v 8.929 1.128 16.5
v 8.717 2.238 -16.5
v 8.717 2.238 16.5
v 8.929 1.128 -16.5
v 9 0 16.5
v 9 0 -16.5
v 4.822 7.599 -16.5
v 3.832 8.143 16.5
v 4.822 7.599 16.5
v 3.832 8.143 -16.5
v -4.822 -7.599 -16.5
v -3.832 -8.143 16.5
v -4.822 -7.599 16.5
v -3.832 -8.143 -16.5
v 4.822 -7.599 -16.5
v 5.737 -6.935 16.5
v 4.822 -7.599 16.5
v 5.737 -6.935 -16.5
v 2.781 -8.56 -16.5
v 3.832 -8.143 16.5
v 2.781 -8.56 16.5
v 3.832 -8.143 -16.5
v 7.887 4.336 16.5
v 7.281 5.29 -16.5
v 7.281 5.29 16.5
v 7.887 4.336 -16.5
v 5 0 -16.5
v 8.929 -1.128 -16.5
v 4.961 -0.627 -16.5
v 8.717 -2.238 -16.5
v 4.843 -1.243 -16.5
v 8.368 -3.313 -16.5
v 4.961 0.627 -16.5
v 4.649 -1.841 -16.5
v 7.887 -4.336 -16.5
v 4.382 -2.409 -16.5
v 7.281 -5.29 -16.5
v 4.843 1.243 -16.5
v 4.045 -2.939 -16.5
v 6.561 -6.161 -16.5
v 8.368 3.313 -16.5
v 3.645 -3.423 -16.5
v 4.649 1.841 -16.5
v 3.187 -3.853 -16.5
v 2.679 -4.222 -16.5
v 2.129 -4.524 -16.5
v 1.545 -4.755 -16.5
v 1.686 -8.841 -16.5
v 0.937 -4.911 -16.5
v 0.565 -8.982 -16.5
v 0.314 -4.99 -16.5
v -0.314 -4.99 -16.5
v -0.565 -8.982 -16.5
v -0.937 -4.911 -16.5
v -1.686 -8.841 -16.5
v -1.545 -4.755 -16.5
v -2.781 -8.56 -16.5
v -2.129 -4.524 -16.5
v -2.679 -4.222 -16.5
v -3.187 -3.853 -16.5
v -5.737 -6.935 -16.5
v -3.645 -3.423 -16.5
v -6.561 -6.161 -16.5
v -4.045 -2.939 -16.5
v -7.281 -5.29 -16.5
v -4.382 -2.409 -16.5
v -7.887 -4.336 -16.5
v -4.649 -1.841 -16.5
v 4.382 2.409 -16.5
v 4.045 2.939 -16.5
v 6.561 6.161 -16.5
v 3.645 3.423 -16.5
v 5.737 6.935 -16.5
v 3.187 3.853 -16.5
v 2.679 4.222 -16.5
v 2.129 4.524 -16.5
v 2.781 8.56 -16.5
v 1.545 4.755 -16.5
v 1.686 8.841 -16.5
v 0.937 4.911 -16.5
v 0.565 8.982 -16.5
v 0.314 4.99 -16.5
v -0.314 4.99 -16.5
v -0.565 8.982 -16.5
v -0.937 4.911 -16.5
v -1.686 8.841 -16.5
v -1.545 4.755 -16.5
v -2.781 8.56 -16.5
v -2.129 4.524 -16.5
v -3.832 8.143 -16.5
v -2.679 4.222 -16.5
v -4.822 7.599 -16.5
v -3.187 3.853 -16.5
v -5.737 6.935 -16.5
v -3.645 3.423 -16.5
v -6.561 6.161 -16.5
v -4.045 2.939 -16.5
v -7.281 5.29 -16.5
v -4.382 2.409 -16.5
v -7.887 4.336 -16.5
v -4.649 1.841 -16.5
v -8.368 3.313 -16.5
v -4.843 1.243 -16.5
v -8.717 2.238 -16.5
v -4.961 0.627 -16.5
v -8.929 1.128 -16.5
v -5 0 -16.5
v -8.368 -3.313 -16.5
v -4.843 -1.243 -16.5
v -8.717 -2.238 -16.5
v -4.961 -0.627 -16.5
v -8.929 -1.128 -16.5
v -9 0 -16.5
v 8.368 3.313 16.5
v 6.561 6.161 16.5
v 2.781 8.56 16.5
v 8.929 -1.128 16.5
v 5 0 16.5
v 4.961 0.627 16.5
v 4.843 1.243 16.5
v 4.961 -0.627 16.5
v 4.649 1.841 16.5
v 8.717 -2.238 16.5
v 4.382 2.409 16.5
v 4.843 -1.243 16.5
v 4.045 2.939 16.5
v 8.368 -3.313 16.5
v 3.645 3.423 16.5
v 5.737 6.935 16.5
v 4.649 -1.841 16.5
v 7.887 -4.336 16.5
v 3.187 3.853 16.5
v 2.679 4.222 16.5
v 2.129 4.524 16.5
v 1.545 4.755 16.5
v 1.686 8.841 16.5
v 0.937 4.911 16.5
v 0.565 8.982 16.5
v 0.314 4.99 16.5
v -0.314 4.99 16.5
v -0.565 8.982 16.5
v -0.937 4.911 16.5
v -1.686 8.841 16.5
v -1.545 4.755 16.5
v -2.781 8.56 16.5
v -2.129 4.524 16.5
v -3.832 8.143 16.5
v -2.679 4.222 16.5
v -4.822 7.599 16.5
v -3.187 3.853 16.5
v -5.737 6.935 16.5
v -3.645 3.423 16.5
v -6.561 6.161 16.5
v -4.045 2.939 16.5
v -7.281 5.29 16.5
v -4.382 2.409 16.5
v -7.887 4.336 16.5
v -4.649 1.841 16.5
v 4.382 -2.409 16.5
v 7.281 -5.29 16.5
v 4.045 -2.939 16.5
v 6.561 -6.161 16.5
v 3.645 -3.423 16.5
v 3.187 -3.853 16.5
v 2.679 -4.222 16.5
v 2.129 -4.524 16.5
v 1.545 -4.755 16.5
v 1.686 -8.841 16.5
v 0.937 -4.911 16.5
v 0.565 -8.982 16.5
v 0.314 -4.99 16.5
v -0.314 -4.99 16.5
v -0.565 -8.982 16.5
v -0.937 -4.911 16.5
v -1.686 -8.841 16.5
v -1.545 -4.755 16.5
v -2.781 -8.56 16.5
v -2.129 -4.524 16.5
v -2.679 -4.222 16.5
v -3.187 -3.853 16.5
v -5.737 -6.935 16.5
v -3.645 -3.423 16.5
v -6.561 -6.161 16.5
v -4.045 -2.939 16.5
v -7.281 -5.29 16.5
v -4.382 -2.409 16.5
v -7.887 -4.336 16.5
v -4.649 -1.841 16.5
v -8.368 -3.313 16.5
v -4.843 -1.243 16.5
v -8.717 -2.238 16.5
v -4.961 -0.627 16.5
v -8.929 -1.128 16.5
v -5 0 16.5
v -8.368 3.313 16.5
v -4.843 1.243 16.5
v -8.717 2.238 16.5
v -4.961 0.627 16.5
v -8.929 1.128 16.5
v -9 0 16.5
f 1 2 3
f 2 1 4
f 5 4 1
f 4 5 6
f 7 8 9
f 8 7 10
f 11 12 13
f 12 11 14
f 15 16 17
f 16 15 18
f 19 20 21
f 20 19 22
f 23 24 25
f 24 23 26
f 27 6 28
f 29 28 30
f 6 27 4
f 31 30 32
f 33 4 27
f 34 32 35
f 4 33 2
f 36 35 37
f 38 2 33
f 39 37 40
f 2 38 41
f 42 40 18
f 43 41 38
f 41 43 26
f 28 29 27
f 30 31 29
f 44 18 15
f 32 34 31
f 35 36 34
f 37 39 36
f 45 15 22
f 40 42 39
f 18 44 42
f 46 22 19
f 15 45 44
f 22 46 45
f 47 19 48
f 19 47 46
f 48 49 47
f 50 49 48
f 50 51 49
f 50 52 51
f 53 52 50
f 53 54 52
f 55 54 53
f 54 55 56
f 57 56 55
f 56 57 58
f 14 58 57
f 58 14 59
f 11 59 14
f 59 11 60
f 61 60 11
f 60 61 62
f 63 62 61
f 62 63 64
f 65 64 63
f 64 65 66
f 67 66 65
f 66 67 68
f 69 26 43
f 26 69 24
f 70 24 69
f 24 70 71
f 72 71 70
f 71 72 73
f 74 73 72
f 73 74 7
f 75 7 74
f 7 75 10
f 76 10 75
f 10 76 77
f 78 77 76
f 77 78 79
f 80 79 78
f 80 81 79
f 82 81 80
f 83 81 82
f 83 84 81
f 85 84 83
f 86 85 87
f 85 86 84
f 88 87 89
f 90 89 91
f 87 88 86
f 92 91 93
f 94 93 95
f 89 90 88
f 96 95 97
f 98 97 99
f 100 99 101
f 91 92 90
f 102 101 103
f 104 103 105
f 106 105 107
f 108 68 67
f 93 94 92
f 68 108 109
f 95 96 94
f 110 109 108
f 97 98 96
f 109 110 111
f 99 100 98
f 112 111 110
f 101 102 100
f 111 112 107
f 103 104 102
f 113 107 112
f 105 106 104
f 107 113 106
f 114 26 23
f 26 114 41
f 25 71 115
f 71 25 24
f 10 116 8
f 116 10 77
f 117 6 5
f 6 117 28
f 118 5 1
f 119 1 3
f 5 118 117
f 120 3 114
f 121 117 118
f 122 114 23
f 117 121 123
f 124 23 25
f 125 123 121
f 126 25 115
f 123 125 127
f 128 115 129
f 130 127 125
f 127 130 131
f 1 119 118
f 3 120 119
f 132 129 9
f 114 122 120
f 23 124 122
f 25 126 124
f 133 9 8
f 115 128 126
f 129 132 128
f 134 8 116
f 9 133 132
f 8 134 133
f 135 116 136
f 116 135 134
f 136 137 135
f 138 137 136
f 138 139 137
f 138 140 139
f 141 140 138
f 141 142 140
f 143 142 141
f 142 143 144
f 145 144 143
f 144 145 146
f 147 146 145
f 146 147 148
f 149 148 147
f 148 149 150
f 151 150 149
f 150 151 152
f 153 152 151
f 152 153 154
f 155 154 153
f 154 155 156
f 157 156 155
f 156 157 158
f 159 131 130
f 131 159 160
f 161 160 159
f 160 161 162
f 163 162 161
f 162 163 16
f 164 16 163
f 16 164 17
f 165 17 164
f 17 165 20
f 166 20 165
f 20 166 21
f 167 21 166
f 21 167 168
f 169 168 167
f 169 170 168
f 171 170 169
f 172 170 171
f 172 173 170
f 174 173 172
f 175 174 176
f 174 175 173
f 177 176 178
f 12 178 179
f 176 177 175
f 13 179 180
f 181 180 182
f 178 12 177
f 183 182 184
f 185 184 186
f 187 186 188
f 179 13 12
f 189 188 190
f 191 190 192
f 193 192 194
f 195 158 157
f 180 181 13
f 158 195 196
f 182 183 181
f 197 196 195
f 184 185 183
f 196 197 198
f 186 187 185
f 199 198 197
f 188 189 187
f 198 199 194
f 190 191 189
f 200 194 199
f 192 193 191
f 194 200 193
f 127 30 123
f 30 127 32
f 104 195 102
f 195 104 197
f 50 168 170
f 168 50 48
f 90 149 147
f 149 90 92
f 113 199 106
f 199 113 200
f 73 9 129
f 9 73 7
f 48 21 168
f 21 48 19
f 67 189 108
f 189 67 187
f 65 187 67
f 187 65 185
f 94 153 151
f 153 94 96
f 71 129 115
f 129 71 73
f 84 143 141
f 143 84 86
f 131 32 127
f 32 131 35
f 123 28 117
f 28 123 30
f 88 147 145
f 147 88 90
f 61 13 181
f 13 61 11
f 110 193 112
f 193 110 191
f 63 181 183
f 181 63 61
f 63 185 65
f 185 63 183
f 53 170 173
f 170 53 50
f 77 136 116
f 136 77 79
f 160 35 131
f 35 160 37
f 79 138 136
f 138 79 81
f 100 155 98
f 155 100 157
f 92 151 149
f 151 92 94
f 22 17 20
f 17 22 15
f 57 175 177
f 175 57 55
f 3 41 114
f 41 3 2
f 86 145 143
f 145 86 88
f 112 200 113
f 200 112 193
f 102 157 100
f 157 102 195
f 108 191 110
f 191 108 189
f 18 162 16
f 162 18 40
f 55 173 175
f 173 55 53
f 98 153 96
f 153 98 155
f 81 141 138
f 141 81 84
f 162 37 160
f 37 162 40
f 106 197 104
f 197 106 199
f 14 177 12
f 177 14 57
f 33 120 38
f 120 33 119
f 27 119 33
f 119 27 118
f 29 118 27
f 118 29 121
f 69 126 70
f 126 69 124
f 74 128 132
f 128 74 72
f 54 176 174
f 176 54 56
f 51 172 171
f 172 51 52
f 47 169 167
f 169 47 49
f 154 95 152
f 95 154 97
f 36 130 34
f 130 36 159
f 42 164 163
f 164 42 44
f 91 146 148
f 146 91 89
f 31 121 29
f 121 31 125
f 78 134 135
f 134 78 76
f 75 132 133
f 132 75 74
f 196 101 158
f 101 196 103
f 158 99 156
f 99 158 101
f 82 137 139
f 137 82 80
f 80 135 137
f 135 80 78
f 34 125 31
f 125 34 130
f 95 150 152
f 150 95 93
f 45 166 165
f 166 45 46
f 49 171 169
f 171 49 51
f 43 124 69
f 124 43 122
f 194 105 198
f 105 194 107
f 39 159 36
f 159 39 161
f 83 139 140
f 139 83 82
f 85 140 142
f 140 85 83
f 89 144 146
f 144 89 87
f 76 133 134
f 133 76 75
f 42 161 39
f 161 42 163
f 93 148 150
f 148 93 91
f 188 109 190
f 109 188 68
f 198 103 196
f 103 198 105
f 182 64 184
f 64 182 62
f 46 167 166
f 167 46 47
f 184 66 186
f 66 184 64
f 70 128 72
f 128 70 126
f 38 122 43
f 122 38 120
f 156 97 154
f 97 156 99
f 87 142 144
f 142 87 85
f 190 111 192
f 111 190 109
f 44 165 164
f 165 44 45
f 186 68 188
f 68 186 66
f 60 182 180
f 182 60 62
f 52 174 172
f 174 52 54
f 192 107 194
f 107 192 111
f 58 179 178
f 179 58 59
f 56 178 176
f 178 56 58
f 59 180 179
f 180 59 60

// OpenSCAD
$fn = 50;


difference() {
	union() {
		translate(v = [0, 0, -16.5000000000]) {
			cylinder(h = 33, r = 9.0000000000);
		}
	}
	union() {
		translate(v = [0, 0, -100.0000000000]) {
			cylinder(h = 200, r = 5.0000000000);
		}
	}
}
